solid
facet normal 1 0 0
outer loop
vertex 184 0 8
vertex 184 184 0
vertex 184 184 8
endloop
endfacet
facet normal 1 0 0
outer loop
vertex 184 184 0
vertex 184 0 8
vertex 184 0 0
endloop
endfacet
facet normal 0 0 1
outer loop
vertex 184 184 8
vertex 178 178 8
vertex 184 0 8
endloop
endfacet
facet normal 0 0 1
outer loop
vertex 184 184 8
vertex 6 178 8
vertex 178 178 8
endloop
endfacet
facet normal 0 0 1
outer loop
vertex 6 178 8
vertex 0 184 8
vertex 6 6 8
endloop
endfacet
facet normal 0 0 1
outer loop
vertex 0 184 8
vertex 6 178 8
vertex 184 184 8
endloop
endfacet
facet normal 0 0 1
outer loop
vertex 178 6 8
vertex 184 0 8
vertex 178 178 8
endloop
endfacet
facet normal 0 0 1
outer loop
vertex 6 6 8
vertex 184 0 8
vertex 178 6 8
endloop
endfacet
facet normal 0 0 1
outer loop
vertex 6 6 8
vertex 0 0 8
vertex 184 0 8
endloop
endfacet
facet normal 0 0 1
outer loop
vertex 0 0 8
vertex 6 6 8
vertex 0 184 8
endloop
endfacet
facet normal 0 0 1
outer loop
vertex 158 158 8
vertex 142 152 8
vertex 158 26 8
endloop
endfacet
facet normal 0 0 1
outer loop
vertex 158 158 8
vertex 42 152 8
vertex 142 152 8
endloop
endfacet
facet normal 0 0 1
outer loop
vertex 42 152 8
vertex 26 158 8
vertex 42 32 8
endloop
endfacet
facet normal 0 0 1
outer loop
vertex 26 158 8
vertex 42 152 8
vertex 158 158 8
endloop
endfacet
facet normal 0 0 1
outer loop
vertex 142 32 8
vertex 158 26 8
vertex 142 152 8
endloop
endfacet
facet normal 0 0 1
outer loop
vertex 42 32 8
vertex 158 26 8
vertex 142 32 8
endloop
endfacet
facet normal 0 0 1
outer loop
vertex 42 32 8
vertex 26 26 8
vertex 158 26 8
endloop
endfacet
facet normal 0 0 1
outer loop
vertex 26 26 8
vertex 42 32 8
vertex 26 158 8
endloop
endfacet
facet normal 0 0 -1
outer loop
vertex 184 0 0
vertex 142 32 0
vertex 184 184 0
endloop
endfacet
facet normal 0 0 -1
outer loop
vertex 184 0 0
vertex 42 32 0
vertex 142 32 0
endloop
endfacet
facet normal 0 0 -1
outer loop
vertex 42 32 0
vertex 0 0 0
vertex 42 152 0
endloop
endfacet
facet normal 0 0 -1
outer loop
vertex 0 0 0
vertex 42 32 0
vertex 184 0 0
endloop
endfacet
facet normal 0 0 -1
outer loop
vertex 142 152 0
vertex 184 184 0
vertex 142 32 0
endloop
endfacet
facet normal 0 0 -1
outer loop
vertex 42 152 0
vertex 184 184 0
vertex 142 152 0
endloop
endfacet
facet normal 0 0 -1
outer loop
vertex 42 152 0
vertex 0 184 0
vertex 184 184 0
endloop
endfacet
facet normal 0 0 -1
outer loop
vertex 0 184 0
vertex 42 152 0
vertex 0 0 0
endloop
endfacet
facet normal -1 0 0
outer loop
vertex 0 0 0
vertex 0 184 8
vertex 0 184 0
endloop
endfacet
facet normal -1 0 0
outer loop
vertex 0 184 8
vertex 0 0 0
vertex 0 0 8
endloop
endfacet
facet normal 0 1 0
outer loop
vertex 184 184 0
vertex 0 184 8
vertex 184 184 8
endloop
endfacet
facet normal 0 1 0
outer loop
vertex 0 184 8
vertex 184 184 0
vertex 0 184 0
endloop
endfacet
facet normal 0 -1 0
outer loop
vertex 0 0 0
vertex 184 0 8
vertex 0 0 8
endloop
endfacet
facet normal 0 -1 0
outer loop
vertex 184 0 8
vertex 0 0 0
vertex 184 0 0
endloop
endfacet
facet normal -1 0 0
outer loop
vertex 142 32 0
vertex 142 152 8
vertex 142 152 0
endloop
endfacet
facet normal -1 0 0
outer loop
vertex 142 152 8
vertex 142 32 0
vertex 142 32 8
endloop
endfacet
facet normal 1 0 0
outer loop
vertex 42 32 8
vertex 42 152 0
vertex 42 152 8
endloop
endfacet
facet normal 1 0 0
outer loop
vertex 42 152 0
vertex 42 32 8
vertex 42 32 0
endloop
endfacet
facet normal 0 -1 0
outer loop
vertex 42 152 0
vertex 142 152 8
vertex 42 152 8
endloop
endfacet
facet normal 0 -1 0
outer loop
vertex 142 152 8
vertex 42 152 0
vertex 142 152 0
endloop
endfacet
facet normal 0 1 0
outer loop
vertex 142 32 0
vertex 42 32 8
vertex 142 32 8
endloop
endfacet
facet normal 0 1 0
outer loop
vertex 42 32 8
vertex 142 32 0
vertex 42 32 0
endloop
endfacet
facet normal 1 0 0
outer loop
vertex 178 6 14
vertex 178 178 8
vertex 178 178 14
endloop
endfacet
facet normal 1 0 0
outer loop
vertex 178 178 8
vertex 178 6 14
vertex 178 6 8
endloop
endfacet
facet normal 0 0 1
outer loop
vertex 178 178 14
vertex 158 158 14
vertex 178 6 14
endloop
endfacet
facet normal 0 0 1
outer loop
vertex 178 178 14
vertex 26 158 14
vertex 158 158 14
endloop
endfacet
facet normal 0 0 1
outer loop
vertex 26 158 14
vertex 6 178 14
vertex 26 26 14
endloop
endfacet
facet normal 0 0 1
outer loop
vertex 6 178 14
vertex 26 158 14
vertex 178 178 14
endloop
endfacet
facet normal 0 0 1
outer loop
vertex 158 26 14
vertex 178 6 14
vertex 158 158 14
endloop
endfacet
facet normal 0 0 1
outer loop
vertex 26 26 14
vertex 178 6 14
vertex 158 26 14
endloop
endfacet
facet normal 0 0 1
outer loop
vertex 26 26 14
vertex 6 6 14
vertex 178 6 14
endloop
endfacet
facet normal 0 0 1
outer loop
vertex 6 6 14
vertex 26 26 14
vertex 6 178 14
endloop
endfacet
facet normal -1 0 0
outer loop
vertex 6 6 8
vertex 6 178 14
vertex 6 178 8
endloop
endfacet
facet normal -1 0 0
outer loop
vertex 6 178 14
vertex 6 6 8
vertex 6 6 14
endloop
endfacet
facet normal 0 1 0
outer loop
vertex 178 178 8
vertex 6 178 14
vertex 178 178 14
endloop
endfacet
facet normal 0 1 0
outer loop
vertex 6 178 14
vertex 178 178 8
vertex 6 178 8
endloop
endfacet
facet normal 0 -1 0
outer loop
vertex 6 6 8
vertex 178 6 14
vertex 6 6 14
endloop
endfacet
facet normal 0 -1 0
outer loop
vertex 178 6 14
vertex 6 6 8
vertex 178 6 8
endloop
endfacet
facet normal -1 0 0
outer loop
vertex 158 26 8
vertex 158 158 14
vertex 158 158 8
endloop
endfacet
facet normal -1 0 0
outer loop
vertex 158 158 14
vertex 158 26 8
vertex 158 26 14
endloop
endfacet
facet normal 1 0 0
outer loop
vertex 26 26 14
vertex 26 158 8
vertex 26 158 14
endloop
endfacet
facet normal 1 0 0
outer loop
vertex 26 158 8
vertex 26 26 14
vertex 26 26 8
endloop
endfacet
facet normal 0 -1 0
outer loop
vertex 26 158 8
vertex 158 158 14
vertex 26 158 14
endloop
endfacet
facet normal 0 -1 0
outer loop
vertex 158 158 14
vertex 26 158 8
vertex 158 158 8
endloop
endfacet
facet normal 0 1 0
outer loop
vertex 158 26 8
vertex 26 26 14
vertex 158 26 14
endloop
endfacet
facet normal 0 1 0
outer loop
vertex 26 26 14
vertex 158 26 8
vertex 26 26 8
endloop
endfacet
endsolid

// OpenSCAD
$fa = 1;
$fs = 0.04;
e = 0.01;

module panel() {
    difference() {
        cube([184, 184, 8]);
        translate([42, 32, 0])
            cube([100, 120, 8 + e]);
    }
}


module light_trap () {
    difference() {
        cube([172, 172, 6]);
        translate([20, 20, 0])
            cube([132, 132, 6 + e]);
    }
}

module spring_back() {
    panel();

    translate([6, 6, 8])
        light_trap();
}

spring_back();
